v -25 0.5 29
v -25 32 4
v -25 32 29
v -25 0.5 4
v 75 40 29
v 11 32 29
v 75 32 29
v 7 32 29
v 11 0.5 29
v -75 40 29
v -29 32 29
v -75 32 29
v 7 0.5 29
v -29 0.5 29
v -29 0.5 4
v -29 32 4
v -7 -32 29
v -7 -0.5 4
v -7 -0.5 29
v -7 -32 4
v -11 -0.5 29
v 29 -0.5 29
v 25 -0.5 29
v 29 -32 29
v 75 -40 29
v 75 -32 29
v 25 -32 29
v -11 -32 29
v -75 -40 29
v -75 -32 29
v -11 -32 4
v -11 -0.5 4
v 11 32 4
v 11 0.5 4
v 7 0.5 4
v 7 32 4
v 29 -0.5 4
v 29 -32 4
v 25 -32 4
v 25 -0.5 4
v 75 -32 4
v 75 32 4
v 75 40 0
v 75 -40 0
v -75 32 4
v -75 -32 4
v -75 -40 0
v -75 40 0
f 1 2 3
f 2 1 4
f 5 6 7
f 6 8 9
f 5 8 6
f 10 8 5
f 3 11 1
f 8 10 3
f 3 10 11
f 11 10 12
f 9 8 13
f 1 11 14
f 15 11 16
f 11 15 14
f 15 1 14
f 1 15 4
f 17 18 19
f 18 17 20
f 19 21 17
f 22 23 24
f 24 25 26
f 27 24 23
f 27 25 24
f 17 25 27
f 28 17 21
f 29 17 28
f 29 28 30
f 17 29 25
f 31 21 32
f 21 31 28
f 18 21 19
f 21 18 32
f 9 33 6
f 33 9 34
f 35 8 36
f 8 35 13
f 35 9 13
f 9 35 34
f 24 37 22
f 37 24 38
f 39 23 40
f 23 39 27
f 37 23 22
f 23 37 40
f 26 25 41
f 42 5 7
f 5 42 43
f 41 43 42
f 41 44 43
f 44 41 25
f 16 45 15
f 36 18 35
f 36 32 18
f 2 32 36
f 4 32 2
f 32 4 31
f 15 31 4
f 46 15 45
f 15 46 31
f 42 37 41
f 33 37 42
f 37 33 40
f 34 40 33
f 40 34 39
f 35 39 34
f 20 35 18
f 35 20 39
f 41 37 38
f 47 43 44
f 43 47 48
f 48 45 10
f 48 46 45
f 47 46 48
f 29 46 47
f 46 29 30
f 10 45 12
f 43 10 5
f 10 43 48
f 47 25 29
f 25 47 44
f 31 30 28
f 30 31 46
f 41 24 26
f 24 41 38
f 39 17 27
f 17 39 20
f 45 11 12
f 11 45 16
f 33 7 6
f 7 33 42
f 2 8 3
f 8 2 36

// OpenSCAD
$fn = 32;

// ----------------------------------------------------------------------
// Rib frame 150 x 80 x 29
// 4 ribs at 18 mm pitch, staggered
// ----------------------------------------------------------------------

// --- parameters (mm) ---
frame = [150, 80, 4];  // base plate size (x, y, z)
rail_w = 8;            // side rail width
ribs = 4;              // number of ribs
rib_t = 4;             // rib thickness
rib_h = 25;            // rib height above the base plate
pitch = 18;            // pitch between rib centres

// --- derived feature positions (mm) ---
span = (ribs - 1) * pitch;          // = 54   distance between the outer ribs
origin_x = -span / 2;               // = -27   X of the first rib
rib_len = frame[1] / 2 - rail_w + 0.5;  // = 32.5   length of a staggered rib
rib_y = 0.5 + rib_len / 2;          // = 16.75   Y of a staggered rib centre
row_offset = 2 * rib_y;             // = 33.5   distance between the two rows
feature_centers = [
  [origin_x + 0 * pitch, rib_y],
  [origin_x + 1 * pitch, -rib_y],
  [origin_x + 2 * pitch, rib_y],
  [origin_x + 3 * pitch, -rib_y]
];   // rib centre line, drives the rib loop

// base plate, two side rails, then the ribs read straight off feature_centers
union() {
  translate([-frame[0] / 2, -frame[1] / 2, 0]) cube(frame);
  translate([-frame[0] / 2, -frame[1] / 2, 0]) cube([frame[0], rail_w, frame[2] + rib_h]);
  translate([-frame[0] / 2, frame[1] / 2 - rail_w, 0]) cube([frame[0], rail_w, frame[2] + rib_h]);
  for (centre = feature_centers)
    translate([centre[0] - rib_t / 2, centre[1] - rib_len / 2, frame[2] - 1])
      cube([rib_t, rib_len, rib_h + 1]);
}
